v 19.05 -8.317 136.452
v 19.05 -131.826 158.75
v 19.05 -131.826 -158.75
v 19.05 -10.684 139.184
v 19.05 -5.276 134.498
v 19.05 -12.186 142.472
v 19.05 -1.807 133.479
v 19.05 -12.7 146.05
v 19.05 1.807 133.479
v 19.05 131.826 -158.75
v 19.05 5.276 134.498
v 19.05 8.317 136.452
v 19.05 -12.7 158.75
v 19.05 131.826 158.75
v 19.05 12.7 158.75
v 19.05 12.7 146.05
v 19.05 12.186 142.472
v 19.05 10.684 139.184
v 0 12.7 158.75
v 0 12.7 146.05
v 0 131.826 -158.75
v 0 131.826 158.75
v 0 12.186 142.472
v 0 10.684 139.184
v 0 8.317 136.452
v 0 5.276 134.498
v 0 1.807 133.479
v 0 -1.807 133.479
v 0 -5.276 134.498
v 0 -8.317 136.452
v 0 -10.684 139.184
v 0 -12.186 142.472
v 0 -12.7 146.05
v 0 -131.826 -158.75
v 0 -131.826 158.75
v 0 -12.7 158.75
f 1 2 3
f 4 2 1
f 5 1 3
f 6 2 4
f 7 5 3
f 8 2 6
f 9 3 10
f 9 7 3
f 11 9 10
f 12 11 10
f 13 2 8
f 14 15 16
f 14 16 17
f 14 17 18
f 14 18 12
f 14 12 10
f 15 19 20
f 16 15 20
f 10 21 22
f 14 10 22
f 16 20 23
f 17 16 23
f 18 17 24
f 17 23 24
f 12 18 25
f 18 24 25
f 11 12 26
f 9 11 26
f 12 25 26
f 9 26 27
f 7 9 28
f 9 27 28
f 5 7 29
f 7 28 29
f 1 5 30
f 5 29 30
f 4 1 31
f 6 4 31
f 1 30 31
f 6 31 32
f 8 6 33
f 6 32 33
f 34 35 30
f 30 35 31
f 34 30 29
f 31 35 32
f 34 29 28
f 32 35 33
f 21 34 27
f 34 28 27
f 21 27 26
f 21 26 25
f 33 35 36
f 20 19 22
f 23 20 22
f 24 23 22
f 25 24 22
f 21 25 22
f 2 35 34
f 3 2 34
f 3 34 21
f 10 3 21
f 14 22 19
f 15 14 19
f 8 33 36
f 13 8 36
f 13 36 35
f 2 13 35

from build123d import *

# Parameters (mm, degrees)
F1_DEPTH = 19.05


with BuildPart() as f1:
    # F0 (on Right) → F1 (new body)
    with BuildSketch(Plane.YZ):
        with BuildLine():
            Line((131.826, -158.75), (131.826, 158.75))
            Line((131.826, 158.75), (12.7, 158.75))
            Line((12.7, 158.75), (12.7, 146.05))
            ThreePointArc((12.7, 146.05), (0, 133.35), (-12.7, 146.05))
            Line((-12.7, 146.05), (-12.7, 158.75))
            Line((-12.7, 158.75), (-131.826, 158.75))
            Line((-131.826, 158.75), (-131.826, -158.75))
            Line((-131.826, -158.75), (131.826, -158.75))
        make_face()
    extrude(amount=F1_DEPTH)


solid = f1.part
